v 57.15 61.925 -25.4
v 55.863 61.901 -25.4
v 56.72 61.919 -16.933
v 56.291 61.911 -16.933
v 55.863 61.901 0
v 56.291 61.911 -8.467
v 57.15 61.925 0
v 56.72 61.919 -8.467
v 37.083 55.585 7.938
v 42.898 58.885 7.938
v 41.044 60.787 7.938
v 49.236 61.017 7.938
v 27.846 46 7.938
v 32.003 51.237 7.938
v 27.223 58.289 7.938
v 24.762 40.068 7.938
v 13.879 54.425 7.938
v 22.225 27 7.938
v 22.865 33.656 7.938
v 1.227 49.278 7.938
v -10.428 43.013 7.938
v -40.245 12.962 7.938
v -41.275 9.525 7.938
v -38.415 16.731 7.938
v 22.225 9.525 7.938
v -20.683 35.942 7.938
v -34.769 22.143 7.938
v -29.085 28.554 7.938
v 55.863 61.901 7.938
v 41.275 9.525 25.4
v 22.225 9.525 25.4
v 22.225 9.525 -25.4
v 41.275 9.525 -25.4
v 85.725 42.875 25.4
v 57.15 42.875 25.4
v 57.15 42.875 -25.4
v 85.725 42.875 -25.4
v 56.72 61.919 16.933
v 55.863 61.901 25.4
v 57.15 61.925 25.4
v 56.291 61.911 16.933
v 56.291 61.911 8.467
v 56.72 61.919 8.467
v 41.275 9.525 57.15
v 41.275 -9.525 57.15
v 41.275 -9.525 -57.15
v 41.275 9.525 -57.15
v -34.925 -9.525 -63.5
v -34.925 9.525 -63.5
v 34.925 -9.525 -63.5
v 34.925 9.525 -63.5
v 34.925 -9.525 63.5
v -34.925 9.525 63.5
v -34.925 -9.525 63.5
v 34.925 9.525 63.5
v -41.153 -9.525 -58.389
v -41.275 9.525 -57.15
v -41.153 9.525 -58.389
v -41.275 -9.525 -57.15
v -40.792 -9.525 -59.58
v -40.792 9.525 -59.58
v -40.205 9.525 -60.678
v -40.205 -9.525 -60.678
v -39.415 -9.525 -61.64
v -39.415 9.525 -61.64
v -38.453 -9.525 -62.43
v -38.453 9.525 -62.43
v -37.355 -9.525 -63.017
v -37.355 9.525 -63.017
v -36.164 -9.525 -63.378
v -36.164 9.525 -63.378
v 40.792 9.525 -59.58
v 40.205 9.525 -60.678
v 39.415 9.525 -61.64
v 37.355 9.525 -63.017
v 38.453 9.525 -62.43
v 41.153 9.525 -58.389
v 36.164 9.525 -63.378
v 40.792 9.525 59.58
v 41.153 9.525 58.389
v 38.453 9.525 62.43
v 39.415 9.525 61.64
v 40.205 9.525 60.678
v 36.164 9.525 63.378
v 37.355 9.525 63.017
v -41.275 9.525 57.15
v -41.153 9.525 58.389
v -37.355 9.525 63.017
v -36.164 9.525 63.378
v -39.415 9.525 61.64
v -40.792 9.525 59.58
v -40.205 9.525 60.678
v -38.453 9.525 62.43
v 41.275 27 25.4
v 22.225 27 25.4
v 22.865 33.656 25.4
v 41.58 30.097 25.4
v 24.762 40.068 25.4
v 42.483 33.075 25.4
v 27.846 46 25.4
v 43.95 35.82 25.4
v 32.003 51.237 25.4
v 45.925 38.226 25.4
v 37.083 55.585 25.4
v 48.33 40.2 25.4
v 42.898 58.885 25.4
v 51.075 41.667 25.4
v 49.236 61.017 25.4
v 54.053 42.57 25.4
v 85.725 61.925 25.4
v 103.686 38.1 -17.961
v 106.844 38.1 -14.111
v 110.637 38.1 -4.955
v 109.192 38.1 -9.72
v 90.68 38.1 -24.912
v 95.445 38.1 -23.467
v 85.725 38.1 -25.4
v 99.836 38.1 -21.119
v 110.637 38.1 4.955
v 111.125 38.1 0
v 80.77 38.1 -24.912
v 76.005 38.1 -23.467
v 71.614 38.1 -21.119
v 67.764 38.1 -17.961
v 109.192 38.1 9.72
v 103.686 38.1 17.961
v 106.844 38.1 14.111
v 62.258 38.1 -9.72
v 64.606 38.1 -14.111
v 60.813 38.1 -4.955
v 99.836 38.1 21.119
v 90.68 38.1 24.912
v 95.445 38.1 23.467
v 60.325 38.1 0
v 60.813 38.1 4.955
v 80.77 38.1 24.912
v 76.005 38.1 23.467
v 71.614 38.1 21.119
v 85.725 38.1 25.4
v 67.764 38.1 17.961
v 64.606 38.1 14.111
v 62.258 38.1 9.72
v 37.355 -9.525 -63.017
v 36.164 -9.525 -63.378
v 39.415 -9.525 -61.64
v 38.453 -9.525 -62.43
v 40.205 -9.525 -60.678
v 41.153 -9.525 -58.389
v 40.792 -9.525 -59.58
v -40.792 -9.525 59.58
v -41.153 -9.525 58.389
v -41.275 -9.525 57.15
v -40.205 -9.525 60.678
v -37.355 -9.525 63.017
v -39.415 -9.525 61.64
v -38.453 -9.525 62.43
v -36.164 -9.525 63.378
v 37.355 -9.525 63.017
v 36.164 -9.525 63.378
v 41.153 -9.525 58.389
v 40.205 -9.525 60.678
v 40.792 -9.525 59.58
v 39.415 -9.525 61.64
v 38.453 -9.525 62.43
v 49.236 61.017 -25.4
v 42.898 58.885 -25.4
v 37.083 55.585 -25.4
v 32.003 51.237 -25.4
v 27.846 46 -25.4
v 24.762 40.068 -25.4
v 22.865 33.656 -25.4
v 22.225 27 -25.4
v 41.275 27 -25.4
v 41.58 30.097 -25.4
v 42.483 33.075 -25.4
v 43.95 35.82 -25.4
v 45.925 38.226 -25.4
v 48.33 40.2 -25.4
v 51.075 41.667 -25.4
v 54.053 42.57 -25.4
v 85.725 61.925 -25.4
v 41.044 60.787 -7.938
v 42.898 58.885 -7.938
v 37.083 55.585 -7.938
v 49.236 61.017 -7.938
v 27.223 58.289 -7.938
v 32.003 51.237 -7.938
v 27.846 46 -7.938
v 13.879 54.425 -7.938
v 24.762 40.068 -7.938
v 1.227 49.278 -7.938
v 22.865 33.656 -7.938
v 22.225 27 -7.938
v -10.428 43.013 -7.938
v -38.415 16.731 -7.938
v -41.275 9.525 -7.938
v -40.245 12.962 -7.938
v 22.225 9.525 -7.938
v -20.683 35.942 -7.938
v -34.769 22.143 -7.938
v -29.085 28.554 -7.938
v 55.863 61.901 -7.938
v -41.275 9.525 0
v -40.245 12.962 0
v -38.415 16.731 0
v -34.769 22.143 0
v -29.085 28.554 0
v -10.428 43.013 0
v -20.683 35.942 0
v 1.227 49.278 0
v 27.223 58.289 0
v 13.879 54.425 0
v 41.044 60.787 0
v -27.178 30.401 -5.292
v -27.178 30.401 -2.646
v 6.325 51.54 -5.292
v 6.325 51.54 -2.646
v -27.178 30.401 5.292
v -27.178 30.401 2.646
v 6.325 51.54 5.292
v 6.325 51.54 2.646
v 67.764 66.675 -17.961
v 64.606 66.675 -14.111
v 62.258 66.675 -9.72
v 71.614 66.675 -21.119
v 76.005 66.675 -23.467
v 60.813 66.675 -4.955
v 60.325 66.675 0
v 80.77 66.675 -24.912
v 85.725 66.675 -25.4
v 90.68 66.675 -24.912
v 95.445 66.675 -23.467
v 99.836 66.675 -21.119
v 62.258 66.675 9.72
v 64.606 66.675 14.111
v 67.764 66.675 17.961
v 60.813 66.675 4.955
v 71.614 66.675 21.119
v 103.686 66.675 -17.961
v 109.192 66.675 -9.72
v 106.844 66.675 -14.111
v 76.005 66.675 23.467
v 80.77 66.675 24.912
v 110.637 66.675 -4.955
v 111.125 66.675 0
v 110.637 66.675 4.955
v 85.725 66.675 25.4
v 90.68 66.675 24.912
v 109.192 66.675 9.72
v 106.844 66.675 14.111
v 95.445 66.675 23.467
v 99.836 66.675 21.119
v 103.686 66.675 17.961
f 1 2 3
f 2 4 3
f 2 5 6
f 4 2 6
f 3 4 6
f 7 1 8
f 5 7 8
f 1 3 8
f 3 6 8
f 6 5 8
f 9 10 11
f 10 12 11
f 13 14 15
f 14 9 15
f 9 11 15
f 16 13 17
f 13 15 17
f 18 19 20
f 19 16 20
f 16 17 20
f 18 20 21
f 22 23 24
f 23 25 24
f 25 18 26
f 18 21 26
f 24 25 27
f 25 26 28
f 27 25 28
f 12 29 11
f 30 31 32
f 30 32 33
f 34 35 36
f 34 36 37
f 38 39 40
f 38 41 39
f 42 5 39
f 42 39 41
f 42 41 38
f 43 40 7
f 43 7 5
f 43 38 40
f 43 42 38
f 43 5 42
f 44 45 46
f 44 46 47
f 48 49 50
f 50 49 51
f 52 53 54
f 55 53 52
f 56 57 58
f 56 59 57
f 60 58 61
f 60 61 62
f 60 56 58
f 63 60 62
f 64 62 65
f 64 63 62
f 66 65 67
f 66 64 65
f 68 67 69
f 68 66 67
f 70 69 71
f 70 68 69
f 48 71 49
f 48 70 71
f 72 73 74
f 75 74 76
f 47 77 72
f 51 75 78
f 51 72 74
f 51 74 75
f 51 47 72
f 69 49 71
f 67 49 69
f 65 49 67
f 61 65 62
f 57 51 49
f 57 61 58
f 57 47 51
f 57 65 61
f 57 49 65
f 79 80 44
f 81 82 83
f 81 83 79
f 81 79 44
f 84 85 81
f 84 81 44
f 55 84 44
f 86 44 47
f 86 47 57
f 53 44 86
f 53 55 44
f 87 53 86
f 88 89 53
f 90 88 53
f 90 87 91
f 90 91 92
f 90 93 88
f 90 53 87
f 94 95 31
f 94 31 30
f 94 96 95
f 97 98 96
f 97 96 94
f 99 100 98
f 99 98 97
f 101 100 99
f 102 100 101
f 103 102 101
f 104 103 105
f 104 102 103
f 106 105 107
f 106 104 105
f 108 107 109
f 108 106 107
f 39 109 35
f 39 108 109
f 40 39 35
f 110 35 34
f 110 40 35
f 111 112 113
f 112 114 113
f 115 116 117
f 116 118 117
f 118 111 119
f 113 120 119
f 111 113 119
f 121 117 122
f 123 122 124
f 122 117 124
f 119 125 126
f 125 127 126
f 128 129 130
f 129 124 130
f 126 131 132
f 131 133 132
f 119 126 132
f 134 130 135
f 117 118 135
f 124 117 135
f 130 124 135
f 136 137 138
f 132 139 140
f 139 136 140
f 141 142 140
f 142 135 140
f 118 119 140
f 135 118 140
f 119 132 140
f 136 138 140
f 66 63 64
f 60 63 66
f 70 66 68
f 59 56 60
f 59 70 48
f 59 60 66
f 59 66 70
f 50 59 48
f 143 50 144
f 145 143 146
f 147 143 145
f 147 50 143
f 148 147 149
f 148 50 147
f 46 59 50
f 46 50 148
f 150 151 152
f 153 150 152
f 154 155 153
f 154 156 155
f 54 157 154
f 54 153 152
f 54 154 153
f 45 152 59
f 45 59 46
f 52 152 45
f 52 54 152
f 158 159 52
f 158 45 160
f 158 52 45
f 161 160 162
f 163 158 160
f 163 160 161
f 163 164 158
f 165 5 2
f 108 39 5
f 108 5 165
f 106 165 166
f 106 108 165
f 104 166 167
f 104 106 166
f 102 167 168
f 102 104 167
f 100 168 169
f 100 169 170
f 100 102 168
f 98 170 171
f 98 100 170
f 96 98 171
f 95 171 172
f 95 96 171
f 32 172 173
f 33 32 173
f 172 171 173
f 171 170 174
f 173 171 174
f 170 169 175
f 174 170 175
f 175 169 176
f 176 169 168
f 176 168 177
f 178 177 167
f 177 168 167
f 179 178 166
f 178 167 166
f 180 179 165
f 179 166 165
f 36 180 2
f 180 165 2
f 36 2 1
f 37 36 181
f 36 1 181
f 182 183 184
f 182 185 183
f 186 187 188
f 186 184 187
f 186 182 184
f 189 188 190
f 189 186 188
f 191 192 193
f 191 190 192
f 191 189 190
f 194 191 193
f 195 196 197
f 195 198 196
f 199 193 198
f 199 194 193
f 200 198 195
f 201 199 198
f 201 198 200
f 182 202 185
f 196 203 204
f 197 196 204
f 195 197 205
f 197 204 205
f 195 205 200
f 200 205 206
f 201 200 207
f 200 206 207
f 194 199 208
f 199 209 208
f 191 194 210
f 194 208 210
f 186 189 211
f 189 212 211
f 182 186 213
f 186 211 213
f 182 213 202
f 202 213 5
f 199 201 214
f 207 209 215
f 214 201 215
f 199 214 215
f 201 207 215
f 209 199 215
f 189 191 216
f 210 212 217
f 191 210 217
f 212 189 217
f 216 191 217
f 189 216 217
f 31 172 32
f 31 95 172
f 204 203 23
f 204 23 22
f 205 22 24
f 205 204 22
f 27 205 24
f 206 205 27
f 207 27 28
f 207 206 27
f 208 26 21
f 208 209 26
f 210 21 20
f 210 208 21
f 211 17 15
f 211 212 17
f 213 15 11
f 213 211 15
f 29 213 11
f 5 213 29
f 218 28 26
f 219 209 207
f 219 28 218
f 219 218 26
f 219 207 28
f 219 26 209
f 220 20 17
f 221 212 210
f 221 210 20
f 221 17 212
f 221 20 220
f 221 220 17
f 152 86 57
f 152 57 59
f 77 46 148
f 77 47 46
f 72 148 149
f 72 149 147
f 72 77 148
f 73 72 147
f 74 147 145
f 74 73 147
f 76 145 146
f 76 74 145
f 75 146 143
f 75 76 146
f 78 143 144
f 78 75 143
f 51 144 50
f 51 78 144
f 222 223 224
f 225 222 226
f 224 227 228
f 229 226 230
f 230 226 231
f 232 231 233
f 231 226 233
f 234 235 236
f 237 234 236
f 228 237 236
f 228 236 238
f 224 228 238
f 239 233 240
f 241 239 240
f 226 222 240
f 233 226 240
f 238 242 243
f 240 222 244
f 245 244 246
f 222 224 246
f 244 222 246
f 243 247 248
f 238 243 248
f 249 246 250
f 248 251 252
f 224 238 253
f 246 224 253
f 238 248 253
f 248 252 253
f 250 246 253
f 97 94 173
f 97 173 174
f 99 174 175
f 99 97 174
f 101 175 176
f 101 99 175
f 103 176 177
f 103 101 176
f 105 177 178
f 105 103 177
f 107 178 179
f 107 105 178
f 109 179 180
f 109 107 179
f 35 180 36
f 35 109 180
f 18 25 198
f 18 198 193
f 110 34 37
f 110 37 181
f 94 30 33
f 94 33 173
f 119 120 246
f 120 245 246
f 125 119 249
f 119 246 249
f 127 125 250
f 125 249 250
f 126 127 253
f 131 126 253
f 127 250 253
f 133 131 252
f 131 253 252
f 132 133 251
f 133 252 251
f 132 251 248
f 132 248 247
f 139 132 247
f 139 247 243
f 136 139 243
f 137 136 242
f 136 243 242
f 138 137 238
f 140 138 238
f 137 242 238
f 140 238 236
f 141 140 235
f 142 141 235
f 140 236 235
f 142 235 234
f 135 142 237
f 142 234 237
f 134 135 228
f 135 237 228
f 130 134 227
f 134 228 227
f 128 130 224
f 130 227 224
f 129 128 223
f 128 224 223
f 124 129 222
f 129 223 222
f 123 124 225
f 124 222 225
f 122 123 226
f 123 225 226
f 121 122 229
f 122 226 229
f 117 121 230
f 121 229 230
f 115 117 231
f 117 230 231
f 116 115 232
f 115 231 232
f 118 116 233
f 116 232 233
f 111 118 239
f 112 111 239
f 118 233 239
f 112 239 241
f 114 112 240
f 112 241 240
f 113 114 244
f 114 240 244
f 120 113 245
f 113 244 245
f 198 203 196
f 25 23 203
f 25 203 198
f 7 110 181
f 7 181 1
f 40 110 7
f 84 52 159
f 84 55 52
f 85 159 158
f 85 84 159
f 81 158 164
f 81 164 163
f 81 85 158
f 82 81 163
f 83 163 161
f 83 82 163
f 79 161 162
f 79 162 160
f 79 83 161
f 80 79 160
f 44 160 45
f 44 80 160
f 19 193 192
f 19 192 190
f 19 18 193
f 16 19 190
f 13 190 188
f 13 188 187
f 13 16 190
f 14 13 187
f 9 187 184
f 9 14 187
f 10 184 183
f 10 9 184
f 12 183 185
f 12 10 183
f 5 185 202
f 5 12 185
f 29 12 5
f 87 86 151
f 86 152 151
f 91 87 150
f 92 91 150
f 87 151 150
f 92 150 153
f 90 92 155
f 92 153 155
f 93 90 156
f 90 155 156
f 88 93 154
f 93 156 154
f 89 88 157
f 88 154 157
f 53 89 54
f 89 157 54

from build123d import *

# Parameters (mm, degrees)
F2_DEPTH = 7.9375
F0_W     = 25.4
F0_H     = 19.05
F3_DEPTH = 25.4
F0_W_2   = 82.55
F0_H_2   = 12.7
F4_DEPTH = 63.5
F5_R     = 6.35


with BuildPart() as f1:
    # F0 (on Top) → F1 (revolve)
    with BuildSketch(Plane.XY):
        Polygon((85.725, 66.675), (85.725, 61.9252), (85.725, 42.8752), (85.725, 38.1), (111.125, 38.1), (111.125, 66.675), align=None)
    revolve(axis=Axis((85.725, 52.3875, 0), (0, -1, 0)))


with BuildPart() as f2:
    # F0 (on Top) → F2 (new body, symmetric)
    with BuildSketch(Plane.XY):
        with BuildLine():
            add(Edge.make_bspline(
                [(-41.275, 9.525), (-38.003408, 26.588724), (-0.569577, 60.609758), (55.863186, 61.901486)],
                knots=[0, 0, 0, 0, 110.665519, 110.665519, 110.665519, 110.665519], degree=3))
            Line((-41.275, 9.525), (22.225, 9.525))
            Line((22.225, 9.525), (22.225, 27.0002))
            ThreePointArc((22.225, 27.0002), (32.003453, 51.236677), (55.863186, 61.901486))
        make_face()
    extrude(amount=F2_DEPTH, both=True)


with BuildPart() as f3:
    # F0 (on Top) → F3 (new body, symmetric)
    with BuildSketch(Plane.XY):
        with BuildLine():
            Line((22.225, 27.0002), (22.225, 9.525))
            Line((22.225, 9.525), (41.275, 9.525))
            Line((41.275, 9.525), (41.275, 27.0002))
            ThreePointArc((41.275, 27.0002), (45.92468, 38.22552), (57.15, 42.8752))
            Line((57.15, 42.8752), (60.325, 42.8752))
            Line((60.325, 42.8752), (60.325, 61.9252))
            Line((60.325, 61.9252), (57.15, 61.9252))
            add(Edge.make_bspline(
                [(55.863186, 61.901486), (56.291034, 61.911279), (56.719974, 61.919191), (57.15, 61.9252)],
                knots=[110.665519, 110.665519, 110.665519, 110.665519, 111.504536, 111.504536, 111.504536, 111.504536], degree=3))
            ThreePointArc((55.863186, 61.901486), (32.003453, 51.236677), (22.225, 27.0002))
        make_face()
        with Locations((73.025, 52.4002)):
            Rectangle(F0_W, F0_H)
    extrude(amount=F3_DEPTH, both=True)


with BuildPart() as f4:
    # F0 (on Top) → F4 (new body, symmetric)
    with BuildSketch(Plane.XY):
        with Locations((0, -3.175)):
            Rectangle(F0_W_2, F0_H_2)
        Polygon((22.225, 9.525), (-41.275, 9.525), (-41.275, 3.175), (41.275, 3.175), (41.275, 9.525), align=None)
    extrude(amount=F4_DEPTH, both=True)

    # F5
    f5_edges = [f4.edges().sort_by_distance(p)[0] for p in [
        (41.275, 0, 63.5),
        (41.275, 0, -63.5),
        (-41.275, 0, -63.5),
        (-41.275, 0, 63.5),
    ]]
    fillet(f5_edges, radius=F5_R)


solid = Compound([f1.part, f2.part, f3.part, f4.part])
